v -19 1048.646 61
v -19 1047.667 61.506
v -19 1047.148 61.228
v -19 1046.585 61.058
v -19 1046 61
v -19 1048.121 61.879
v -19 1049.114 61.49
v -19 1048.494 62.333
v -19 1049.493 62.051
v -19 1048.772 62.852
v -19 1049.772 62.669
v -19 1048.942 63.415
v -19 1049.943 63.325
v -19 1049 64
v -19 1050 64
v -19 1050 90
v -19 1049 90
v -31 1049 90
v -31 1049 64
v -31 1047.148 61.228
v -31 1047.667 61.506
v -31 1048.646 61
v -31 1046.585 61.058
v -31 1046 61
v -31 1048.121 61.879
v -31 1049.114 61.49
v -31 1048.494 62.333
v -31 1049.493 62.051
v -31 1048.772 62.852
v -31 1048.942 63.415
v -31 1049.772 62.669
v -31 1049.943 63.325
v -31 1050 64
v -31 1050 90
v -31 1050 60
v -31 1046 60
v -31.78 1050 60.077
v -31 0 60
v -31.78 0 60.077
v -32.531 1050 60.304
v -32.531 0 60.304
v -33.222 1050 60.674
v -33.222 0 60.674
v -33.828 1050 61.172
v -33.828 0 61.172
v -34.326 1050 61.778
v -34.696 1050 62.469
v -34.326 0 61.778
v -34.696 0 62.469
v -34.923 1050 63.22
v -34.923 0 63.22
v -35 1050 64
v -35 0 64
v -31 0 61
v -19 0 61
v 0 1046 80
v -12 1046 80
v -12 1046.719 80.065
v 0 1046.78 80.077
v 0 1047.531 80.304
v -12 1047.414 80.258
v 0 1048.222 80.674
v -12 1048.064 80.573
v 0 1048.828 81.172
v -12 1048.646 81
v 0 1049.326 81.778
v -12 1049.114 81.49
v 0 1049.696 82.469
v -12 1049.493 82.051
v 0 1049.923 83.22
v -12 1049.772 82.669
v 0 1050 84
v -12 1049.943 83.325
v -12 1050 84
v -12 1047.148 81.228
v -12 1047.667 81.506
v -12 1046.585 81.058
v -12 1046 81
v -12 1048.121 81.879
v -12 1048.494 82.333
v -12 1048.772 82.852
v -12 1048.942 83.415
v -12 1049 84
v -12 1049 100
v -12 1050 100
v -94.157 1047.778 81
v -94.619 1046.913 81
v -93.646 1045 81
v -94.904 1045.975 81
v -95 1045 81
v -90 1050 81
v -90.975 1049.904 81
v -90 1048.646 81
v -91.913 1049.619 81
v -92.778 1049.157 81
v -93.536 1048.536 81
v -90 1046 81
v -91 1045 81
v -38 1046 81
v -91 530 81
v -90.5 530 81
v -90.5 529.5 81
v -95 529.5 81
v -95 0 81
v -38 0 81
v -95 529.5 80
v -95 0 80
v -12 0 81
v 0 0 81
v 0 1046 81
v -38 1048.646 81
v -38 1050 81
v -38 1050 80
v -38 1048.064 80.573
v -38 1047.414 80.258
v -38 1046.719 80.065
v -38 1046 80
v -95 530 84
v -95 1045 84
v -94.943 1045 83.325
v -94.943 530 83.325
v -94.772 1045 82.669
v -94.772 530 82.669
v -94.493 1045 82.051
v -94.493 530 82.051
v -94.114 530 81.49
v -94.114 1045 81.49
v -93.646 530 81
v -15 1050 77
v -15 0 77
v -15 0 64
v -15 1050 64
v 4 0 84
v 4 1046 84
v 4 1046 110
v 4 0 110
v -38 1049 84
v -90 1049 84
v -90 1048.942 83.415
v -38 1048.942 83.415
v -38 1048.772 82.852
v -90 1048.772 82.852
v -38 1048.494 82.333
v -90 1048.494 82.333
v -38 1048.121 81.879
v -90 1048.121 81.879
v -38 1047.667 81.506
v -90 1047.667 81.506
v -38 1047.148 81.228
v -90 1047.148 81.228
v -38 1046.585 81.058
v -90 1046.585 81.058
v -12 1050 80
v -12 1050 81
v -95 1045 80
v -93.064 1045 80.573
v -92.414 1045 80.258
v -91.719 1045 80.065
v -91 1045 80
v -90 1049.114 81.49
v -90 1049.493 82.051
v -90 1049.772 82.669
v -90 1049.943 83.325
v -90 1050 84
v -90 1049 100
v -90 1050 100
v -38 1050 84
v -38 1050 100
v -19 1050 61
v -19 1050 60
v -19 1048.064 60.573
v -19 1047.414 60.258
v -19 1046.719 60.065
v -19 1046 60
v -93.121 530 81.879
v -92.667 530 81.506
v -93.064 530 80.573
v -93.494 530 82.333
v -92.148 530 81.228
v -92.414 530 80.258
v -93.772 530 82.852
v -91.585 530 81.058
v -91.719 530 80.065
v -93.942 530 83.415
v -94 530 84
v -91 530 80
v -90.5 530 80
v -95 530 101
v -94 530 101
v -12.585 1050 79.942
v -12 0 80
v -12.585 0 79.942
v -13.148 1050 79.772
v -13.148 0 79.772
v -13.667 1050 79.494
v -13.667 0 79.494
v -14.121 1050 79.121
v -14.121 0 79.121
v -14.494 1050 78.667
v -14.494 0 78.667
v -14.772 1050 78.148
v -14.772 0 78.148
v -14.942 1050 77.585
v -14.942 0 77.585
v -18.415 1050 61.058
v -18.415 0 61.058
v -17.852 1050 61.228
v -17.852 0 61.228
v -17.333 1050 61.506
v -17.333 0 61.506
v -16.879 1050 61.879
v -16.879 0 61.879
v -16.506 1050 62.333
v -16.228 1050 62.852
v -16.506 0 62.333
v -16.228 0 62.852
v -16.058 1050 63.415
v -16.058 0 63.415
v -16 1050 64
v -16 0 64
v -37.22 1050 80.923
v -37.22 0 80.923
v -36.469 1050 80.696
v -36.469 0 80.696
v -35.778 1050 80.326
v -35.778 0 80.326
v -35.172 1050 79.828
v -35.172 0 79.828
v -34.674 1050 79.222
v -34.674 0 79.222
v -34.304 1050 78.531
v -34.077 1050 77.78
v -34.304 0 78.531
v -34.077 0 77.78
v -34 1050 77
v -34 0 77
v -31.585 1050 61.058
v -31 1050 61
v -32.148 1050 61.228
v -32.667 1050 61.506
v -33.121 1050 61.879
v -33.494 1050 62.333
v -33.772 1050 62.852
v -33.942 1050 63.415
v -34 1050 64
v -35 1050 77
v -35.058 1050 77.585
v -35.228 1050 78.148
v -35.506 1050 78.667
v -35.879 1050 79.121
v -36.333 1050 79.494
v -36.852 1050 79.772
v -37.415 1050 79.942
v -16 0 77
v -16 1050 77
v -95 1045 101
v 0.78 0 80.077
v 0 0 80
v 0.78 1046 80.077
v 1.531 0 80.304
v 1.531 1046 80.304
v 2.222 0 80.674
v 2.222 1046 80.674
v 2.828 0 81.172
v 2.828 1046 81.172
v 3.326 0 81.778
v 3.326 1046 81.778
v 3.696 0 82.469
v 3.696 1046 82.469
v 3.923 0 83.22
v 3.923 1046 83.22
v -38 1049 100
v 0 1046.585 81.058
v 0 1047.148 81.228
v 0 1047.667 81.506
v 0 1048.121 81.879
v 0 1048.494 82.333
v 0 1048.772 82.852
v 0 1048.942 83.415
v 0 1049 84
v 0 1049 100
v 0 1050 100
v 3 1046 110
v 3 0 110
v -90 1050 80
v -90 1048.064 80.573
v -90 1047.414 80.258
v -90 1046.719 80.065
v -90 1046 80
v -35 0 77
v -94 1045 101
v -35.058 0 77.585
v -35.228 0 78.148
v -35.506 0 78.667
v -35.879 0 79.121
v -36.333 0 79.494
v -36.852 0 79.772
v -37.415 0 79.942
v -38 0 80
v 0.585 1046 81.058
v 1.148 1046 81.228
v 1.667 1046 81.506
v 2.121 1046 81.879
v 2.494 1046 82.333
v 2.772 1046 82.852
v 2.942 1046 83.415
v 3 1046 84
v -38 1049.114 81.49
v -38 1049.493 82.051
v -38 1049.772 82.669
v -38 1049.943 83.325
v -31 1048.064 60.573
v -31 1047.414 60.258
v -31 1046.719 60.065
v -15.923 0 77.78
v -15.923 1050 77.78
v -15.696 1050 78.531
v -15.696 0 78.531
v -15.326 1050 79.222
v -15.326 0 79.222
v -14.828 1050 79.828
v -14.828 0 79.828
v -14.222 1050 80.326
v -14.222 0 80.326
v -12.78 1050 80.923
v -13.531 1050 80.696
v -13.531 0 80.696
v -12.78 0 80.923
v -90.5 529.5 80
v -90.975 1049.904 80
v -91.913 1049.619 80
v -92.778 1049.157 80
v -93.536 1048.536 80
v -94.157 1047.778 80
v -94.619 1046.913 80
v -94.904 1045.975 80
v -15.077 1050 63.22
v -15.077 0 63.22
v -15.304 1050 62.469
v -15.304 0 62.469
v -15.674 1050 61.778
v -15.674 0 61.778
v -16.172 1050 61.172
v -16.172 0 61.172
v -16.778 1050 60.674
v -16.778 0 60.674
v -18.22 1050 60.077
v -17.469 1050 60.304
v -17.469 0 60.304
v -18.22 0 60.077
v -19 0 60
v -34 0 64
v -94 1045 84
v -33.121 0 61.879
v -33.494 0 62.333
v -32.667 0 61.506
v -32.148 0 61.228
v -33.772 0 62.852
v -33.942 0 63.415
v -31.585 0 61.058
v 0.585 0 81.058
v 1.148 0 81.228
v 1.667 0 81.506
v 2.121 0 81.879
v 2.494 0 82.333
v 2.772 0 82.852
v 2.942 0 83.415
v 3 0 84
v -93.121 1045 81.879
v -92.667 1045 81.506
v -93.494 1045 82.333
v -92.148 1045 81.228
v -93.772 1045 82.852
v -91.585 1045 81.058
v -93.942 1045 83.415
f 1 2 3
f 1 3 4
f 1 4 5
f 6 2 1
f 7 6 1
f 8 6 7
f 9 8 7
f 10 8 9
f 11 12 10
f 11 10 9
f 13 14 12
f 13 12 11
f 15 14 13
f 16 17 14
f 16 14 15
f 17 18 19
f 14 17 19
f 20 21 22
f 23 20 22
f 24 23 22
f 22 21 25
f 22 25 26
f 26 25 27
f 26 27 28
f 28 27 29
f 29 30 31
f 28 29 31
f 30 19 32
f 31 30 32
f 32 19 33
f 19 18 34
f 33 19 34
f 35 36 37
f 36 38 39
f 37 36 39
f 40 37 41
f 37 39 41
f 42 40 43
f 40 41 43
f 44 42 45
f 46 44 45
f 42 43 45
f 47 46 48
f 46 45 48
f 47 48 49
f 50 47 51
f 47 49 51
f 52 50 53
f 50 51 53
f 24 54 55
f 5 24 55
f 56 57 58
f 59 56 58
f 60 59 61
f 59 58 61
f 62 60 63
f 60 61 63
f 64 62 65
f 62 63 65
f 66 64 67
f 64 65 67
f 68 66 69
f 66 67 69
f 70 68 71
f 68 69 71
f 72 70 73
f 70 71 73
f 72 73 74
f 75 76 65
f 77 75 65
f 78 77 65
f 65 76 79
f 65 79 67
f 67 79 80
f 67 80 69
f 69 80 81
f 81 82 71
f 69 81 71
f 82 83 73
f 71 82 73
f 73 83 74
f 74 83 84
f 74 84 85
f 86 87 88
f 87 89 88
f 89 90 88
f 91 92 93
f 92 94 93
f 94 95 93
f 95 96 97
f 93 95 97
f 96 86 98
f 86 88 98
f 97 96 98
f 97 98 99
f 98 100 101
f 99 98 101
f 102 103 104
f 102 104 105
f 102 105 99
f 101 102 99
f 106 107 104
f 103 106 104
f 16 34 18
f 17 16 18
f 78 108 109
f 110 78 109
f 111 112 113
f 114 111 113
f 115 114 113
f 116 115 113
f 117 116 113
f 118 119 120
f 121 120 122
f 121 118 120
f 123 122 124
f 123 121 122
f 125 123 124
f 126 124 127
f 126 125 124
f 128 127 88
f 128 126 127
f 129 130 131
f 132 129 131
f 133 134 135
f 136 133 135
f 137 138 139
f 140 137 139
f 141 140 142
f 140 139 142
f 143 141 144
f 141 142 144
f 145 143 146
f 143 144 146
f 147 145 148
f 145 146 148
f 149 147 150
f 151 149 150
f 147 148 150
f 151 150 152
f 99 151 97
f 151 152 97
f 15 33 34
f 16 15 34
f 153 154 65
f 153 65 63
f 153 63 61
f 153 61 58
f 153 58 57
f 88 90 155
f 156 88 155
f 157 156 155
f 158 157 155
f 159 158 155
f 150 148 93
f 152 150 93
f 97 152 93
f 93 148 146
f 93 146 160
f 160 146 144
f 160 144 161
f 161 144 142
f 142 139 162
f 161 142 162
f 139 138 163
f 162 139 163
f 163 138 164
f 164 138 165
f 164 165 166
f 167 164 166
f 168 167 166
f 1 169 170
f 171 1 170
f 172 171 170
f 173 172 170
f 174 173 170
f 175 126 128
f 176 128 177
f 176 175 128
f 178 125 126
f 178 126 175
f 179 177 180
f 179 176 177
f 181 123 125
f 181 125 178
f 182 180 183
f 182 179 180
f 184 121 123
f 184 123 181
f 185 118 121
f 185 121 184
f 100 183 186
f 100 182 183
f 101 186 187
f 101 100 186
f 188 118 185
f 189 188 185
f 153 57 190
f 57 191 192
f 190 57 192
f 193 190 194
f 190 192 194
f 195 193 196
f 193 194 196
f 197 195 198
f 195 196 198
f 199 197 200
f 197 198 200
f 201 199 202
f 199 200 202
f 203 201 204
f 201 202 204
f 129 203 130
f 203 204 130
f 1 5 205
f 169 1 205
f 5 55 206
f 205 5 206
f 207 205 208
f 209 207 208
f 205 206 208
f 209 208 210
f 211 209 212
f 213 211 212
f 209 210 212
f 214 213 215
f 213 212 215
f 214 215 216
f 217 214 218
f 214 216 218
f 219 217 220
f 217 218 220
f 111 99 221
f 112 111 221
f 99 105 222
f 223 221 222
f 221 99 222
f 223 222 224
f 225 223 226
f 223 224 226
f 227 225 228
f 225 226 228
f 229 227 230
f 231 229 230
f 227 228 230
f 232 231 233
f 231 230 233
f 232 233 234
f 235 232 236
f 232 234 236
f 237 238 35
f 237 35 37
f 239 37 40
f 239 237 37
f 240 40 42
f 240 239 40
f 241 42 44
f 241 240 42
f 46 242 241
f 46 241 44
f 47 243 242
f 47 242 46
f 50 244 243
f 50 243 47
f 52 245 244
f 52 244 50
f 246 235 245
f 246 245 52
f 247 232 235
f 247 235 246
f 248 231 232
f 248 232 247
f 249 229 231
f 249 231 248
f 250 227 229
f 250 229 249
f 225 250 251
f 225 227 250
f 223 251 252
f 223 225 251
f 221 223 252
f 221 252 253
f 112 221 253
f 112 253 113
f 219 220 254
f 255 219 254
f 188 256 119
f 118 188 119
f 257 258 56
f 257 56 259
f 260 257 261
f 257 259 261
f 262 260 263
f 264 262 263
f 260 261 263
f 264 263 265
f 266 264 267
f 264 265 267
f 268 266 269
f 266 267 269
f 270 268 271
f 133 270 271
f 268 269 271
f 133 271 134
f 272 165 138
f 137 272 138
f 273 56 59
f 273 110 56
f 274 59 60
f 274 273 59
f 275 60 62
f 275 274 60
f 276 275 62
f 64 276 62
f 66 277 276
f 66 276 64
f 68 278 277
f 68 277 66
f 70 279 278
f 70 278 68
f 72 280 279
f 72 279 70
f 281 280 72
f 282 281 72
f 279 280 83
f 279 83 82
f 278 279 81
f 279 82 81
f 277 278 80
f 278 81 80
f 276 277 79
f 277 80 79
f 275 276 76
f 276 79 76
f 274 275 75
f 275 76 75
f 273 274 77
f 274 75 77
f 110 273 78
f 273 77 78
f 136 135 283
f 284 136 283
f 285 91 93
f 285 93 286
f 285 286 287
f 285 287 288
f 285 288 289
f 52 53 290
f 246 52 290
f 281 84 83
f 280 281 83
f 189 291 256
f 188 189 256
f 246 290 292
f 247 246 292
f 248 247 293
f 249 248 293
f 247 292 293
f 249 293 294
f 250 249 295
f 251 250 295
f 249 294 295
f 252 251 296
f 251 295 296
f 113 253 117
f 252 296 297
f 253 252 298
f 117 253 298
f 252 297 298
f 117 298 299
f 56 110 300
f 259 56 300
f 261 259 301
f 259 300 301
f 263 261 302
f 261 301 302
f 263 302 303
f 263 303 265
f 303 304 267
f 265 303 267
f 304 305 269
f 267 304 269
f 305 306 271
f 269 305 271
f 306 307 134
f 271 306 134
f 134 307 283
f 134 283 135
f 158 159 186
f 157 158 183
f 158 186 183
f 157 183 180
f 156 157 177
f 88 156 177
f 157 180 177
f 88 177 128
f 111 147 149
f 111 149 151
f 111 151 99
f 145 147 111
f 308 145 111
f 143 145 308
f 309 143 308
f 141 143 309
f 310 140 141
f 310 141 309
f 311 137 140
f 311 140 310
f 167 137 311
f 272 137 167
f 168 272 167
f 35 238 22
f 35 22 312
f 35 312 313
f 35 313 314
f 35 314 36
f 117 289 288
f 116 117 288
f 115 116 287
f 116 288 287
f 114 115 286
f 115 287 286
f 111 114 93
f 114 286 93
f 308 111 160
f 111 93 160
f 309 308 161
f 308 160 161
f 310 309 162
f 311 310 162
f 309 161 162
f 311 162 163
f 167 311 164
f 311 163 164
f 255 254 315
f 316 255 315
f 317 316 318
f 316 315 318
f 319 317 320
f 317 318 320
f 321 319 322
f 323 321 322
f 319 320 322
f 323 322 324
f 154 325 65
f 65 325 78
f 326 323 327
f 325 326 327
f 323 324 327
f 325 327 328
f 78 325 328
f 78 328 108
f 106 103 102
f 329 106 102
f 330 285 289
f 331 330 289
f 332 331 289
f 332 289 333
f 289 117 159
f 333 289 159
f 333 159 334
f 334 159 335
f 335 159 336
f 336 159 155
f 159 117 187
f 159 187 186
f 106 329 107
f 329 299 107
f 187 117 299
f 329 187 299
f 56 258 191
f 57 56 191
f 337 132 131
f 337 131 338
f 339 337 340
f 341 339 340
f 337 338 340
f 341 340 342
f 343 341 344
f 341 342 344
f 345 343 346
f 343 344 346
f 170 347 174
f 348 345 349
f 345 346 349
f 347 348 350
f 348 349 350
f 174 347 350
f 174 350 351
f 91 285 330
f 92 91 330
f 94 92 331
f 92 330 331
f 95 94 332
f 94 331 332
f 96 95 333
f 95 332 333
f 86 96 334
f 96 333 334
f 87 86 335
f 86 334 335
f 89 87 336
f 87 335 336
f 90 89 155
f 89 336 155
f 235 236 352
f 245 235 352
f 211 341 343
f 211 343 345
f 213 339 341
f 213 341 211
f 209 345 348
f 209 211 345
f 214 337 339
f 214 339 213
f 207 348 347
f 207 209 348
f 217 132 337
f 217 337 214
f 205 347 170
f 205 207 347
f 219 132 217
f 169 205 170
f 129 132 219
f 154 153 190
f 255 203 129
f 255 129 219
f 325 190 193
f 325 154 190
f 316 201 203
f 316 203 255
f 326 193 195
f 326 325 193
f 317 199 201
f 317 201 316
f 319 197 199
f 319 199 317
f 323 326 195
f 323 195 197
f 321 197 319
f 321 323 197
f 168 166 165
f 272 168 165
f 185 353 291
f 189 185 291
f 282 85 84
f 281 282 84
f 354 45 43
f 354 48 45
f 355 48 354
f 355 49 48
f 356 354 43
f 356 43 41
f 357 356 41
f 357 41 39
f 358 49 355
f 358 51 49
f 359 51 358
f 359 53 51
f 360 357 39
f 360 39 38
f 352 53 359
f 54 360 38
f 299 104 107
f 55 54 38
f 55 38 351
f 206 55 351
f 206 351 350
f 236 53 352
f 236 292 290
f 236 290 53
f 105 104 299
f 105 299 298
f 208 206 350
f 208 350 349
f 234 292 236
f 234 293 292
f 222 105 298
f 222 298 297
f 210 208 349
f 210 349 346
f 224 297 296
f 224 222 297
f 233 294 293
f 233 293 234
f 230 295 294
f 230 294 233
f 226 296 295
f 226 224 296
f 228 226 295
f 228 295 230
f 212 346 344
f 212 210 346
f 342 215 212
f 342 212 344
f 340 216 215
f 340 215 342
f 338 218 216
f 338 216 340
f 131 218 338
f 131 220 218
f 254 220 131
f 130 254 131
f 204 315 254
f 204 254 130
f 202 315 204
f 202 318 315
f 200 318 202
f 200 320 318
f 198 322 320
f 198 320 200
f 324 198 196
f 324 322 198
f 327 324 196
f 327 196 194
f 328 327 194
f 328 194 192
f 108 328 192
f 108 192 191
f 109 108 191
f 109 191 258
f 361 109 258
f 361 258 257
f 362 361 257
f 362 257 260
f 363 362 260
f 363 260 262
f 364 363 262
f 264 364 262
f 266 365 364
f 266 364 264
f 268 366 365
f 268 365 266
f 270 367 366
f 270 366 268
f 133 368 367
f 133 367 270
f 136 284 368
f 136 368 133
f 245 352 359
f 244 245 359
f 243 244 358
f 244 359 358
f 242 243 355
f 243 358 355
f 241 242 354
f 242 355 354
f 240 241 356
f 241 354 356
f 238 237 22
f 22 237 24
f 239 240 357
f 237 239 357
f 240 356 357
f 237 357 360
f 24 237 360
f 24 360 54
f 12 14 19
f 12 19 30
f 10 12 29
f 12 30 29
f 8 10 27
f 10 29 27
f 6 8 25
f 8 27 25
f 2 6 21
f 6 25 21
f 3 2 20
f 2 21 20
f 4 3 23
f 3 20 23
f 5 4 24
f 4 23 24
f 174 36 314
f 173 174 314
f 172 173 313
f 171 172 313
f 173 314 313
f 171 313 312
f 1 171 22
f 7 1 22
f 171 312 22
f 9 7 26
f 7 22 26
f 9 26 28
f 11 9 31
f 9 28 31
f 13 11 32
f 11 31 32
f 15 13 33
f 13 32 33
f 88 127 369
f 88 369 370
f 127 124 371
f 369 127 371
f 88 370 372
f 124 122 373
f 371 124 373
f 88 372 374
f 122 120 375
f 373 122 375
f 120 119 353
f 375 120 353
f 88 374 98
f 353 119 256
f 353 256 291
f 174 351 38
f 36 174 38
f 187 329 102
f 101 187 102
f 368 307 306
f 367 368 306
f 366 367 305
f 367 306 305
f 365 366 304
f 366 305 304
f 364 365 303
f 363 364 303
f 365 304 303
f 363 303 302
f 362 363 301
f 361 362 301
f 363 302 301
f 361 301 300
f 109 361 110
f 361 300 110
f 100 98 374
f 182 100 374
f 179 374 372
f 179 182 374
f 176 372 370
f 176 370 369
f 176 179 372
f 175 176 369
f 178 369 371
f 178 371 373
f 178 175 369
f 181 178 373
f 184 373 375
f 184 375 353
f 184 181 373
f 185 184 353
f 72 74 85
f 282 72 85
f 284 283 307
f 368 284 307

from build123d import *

# Parameters (mm, degrees)
BASE_FLANGE1_DEPTH             = 1050
CUT_EXTRUDE1_REACH             = 1056.479
EDGE_FLANGE5_STRIP_W           = 20
EDGE_FLANGE5_STRIP_H           = 1
EDGE_FLANGE5_STRIP_CUT_DEPTH   = 52
EDGE_FLANGE5_STRIP_2_W         = 20
EDGE_FLANGE5_STRIP_2_H         = 1
EDGE_FLANGE5_STRIP_CUT_2_DEPTH = 12
EDGE_FLANGE5_DEPTH             = 52
EDGE_FLANGE5_BEND_DEPTH        = 12
EDGE_FLANGE7_DEPTH             = 1046
EDGE_FLANGE8_STRIP_W           = 10
EDGE_FLANGE8_STRIP_H           = 1
EDGE_FLANGE8_STRIP_CUT_DEPTH   = 12
EDGE_FLANGE8_DEPTH             = 12
EDGE_FLANGE9_START             = 529.5
EDGE_FLANGE9_DEPTH             = 515.5
EDGE_FLANGE9_2_DEPTH           = 0.5
EDGE_FLANGE9_START_2           = 530
EDGE_FLANGE9_3_DEPTH           = 515


# Read off the part's stored shape, not the designer's step: Edge-Flange9
# Sheet-metal steps are written as plain solids
with BuildPart() as part:
    # Sketch1 → Base-Flange1 (new body)
    with BuildSketch(Plane(origin=(0, 0, 0), x_dir=(1, 0, 0), z_dir=(0, 1, 0))):
        with BuildLine():
            Line((0, 0), (-12, 0))
            ThreePointArc((-12, 0), (-14.121320344, -0.878679656), (-15, -3))
            Line((-15, -3), (-15, -16))
            ThreePointArc((-15, -16), (-16.171572875, -18.828427125), (-19, -20))
            Line((-19, -20), (-31, -20))
            ThreePointArc((-31, -20), (-33.828427125, -18.828427125), (-35, -16))
            Line((-35, -16), (-35, -3))
            ThreePointArc((-35, -3), (-35.878679656, -0.878679656), (-38, 0))
            Line((-38, 0), (-95, 0))
            Line((-95, 0), (-95, 1))
            Line((-95, 1), (-38, 1))
            ThreePointArc((-38, 1), (-35.171572875, -0.171572875), (-34, -3))
            Line((-34, -3), (-34, -16))
            ThreePointArc((-34, -16), (-33.121320344, -18.121320344), (-31, -19))
            Line((-31, -19), (-19, -19))
            ThreePointArc((-19, -19), (-16.878679656, -18.121320344), (-16, -16))
            Line((-16, -16), (-16, -3))
            ThreePointArc((-16, -3), (-14.828427125, -0.171572875), (-12, 1))
            Line((-12, 1), (0, 1))
            Line((0, 1), (0, 0))
        make_face()
    extrude(amount=BASE_FLANGE1_DEPTH)

    # Sketch18 → Cut-Extrude1 (cut, up to next)
    with BuildSketch(Plane.XY, mode=Mode.PRIVATE) as cut_extrude1_sk1:
        with BuildLine():
            Line((-95, 1045), (-95, 1050))
            Line((-95, 1050), (-90, 1050))
            ThreePointArc((-90, 1050), (-93.535533906, 1048.535533906), (-95, 1045))
        make_face()
    cut_extrude1_tool1 = extrude(cut_extrude1_sk1.sketch, amount=-CUT_EXTRUDE1_REACH, mode=Mode.PRIVATE) & part.part
    add(cut_extrude1_tool1.solids().sort_by_distance((-93.88316, 1048.88316, 0))[0], mode=Mode.SUBTRACT)

    # Edge-Flange5 strip (across the edge) → Edge-Flange5 strip cut (cut)
    with BuildSketch(Plane(origin=(-90, 1050, -1), x_dir=(0, -1, 0), z_dir=(1, 0, 0))):
        with Locations((-6, -0.5)):
            Rectangle(EDGE_FLANGE5_STRIP_W, EDGE_FLANGE5_STRIP_H)
    extrude(amount=EDGE_FLANGE5_STRIP_CUT_DEPTH, mode=Mode.SUBTRACT)

    # Edge-Flange5 strip 2 (across the edge) → Edge-Flange5 strip cut 2 (cut)
    with BuildSketch(Plane(origin=(-12, 1050, -1), x_dir=(0, -1, 0), z_dir=(1, 0, 0))):
        with Locations((-6, -0.5)):
            Rectangle(EDGE_FLANGE5_STRIP_2_W, EDGE_FLANGE5_STRIP_2_H)
    extrude(amount=EDGE_FLANGE5_STRIP_CUT_2_DEPTH, mode=Mode.SUBTRACT)

    # Edge-Flange5 section (across the edge) → Edge-Flange5 (add)
    with BuildSketch(Plane(origin=(-90, 1050, -1), x_dir=(0, -1, 0), z_dir=(1, 0, 0))):
        with BuildLine():
            Line((0, 3), (0, 19))
            Line((0, 19), (1, 19))
            Line((1, 19), (1, 3))
            ThreePointArc((1, 3), (1.878679656, 0.878679656), (4, 0))
            Line((4, 0), (4, -1))
            ThreePointArc((4, -1), (1.171572875, 0.171572875), (0, 3))
        make_face()
    extrude(amount=EDGE_FLANGE5_DEPTH)

    # Edge-Flange5 section 2 (across the edge) → Edge-Flange5 bend (add)
    with BuildSketch(Plane(origin=(-12, 1050, -1), x_dir=(0, -1, 0), z_dir=(1, 0, 0))):
        with BuildLine():
            Line((0, 3), (0, 19))
            Line((0, 19), (1, 19))
            Line((1, 19), (1, 3))
            ThreePointArc((1, 3), (1.878679656, 0.878679656), (4, 0))
            Line((4, 0), (4, -1))
            ThreePointArc((4, -1), (1.171572875, 0.171572875), (0, 3))
        make_face()
    extrude(amount=EDGE_FLANGE5_BEND_DEPTH)

    # Edge-Flange7 section (across the edge) → Edge-Flange7 (add)
    with BuildSketch(Plane(origin=(3, 1046, -1), x_dir=(-1, 0, 0), z_dir=(0, -1, 0))):
        with BuildLine():
            Line((-1, 3), (-1, 29))
            Line((-1, 29), (0, 29))
            Line((0, 29), (0, 3))
            ThreePointArc((0, 3), (0.878679656, 0.878679656), (3, 0))
            Line((3, 0), (3, -1))
            ThreePointArc((3, -1), (0.171572875, 0.171572875), (-1, 3))
        make_face()
    extrude(amount=EDGE_FLANGE7_DEPTH)

    # Edge-Flange8 strip (across the edge) → Edge-Flange8 strip cut (cut)
    with BuildSketch(Plane(origin=(-31, 1050, 19), x_dir=(0, -1, 0), z_dir=(1, 0, 0))):
        with Locations((-1, -0.5)):
            Rectangle(EDGE_FLANGE8_STRIP_W, EDGE_FLANGE8_STRIP_H)
    extrude(amount=EDGE_FLANGE8_STRIP_CUT_DEPTH, mode=Mode.SUBTRACT)

    # Edge-Flange8 section (across the edge) → Edge-Flange8 (add)
    with BuildSketch(Plane(origin=(-31, 1050, 19), x_dir=(0, -1, 0), z_dir=(1, 0, 0))):
        with BuildLine():
            Line((0, 3), (0, 29))
            Line((0, 29), (1, 29))
            Line((1, 29), (1, 3))
            ThreePointArc((1, 3), (1.878679656, 0.878679656), (4, 0))
            Line((4, 0), (4, -1))
            ThreePointArc((4, -1), (1.171572875, 0.171572875), (0, 3))
        make_face()
    extrude(amount=EDGE_FLANGE8_DEPTH)

    # Edge-Flange9 outline → Edge-Flange9 (cut)
    with BuildSketch(Plane(origin=(0, 0, 0), x_dir=(1, 0, 0), z_dir=(0, 1, 0)).offset(EDGE_FLANGE9_START)):
        with BuildLine():
            ThreePointArc((-91, 0), (-92.414213563, 0.258342613), (-93.645751312, 1))
            Line((-93.645751312, 1), (-95, 1))
            Line((-95, 1), (-95, 0))
            Line((-95, 0), (-91, 0))
        make_face()
    extrude(amount=EDGE_FLANGE9_DEPTH, mode=Mode.SUBTRACT)

    # Edge-Flange9 2 outline → Edge-Flange9 2 (cut)
    with BuildSketch(Plane(origin=(0, 0, 0), x_dir=(1, 0, 0), z_dir=(0, 1, 0)).offset(EDGE_FLANGE9_START)):
        with BuildLine():
            Line((-90.5, 1), (-93.645751312, 1))
            ThreePointArc((-93.645751312, 1), (-92.414213563, 0.258342613), (-91, 0))
            Line((-91, 0), (-90.5, 0))
            Line((-90.5, 0), (-90.5, 1))
        make_face()
    extrude(amount=EDGE_FLANGE9_2_DEPTH, mode=Mode.SUBTRACT)

    # Edge-Flange9 3 outline → Edge-Flange9 3 (add)
    with BuildSketch(Plane(origin=(0, 0, 0), x_dir=(1, 0, 0), z_dir=(0, 1, 0)).offset(EDGE_FLANGE9_START_2)):
        with BuildLine():
            Line((-95, 21), (-95, 4))
            ThreePointArc((-95, 4), (-94.645751311, 2.354248689), (-93.645751312, 1))
            Line((-93.645751312, 1), (-91, 1))
            ThreePointArc((-91, 1), (-93.121320344, 1.878679656), (-94, 4))
            Line((-94, 4), (-94, 21))
            Line((-94, 21), (-95, 21))
        make_face()
    extrude(amount=EDGE_FLANGE9_3_DEPTH)


with BuildPart() as body_2:
    # Mirror5: mirrored copy
    add(part.part.mirror(Plane.XY.offset(40)))


solid = body_2.part
